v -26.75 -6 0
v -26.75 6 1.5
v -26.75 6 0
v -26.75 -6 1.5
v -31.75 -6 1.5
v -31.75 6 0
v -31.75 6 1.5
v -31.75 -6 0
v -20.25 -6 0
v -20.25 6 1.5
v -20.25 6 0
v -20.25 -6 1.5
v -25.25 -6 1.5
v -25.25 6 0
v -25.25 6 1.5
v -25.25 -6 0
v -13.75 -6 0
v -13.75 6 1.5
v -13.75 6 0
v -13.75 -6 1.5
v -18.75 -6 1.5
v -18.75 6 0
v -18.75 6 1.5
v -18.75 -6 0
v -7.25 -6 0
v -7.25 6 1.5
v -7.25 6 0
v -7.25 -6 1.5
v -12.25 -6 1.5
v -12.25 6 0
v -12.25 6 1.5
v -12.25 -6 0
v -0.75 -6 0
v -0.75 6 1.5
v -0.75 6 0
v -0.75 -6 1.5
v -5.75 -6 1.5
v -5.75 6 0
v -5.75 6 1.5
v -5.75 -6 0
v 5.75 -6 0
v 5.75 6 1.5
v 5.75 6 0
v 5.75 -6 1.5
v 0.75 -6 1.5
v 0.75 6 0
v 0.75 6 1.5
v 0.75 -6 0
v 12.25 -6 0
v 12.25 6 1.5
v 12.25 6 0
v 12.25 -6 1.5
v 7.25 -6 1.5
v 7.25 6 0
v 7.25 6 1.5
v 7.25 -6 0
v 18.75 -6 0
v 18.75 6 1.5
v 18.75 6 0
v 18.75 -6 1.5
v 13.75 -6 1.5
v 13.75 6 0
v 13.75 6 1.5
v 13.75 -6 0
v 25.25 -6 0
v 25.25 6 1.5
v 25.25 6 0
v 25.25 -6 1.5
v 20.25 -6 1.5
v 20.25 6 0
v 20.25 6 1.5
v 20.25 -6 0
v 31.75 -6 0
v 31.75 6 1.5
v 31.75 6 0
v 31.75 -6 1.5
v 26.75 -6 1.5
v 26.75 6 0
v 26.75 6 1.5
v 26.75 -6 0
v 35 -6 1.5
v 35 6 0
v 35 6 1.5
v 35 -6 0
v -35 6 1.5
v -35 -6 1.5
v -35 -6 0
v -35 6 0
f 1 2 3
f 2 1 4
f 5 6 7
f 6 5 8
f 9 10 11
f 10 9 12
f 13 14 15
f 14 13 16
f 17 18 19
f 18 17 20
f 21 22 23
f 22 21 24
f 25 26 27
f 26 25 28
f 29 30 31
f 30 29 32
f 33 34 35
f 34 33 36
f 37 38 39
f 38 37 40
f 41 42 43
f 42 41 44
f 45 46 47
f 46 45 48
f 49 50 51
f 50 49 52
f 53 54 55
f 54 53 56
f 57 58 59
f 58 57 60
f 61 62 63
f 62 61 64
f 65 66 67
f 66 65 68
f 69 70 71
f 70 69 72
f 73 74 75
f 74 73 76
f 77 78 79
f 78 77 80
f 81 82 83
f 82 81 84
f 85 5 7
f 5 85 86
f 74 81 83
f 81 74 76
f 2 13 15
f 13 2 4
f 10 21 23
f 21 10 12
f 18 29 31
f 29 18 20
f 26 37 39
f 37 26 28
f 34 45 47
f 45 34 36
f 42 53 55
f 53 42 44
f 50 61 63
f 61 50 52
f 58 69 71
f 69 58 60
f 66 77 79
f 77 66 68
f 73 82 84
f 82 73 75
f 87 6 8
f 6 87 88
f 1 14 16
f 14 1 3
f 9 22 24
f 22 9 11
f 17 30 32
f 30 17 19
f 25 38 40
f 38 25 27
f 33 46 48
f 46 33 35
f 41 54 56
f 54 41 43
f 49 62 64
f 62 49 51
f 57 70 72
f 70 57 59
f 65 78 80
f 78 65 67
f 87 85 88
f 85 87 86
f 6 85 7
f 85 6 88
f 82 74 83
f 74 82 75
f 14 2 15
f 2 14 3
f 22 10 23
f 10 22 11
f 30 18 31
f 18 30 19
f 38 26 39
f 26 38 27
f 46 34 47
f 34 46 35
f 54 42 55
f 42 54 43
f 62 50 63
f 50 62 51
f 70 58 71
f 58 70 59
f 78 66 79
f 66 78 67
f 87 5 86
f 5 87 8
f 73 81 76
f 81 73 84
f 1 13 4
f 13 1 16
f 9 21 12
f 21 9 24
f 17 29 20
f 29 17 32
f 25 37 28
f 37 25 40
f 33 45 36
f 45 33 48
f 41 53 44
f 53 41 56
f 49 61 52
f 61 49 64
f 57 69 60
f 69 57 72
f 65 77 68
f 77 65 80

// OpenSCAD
// 10-well agarose gel casting comb
// Print orientation: flat on bed, teeth pointing down (-Y)

$fn = 64;

// ---- Dimensions (mm) ----
plate_t      = 1.5;   // plate thickness (Z)
spine_len    = 70;    // spine length (X)
spine_w      = 12;    // spine width (Y)
tooth_w      = 5.0;   // tooth width (X)
tooth_len    = 12;    // tooth length (Y)
tooth_count  = 10;    // number of teeth
gap          = 1.5;   // gap between teeth (X)
eps          = 0.5;   // cutter overshoot past faces

// ---- Derived ----
pitch   = tooth_w + gap;          // centre-to-centre spacing of teeth
x_start = -(tooth_count - 1) * pitch / 2;  // first tooth centre (row centred on spine)

// ---- Model ----
difference() {
    // Base plate with spine
    translate([-spine_len / 2, -spine_w / 2, 0])
        cube([spine_len, spine_w, plate_t]);

    // Teeth cut out from the plate
    for (i = [0 : tooth_count - 1])
        translate([x_start + i * pitch - tooth_w / 2,
                   -tooth_len / 2 - eps,
                   -eps])
            cube([tooth_w, tooth_len + 2 * eps, plate_t + 2 * eps]);
}
